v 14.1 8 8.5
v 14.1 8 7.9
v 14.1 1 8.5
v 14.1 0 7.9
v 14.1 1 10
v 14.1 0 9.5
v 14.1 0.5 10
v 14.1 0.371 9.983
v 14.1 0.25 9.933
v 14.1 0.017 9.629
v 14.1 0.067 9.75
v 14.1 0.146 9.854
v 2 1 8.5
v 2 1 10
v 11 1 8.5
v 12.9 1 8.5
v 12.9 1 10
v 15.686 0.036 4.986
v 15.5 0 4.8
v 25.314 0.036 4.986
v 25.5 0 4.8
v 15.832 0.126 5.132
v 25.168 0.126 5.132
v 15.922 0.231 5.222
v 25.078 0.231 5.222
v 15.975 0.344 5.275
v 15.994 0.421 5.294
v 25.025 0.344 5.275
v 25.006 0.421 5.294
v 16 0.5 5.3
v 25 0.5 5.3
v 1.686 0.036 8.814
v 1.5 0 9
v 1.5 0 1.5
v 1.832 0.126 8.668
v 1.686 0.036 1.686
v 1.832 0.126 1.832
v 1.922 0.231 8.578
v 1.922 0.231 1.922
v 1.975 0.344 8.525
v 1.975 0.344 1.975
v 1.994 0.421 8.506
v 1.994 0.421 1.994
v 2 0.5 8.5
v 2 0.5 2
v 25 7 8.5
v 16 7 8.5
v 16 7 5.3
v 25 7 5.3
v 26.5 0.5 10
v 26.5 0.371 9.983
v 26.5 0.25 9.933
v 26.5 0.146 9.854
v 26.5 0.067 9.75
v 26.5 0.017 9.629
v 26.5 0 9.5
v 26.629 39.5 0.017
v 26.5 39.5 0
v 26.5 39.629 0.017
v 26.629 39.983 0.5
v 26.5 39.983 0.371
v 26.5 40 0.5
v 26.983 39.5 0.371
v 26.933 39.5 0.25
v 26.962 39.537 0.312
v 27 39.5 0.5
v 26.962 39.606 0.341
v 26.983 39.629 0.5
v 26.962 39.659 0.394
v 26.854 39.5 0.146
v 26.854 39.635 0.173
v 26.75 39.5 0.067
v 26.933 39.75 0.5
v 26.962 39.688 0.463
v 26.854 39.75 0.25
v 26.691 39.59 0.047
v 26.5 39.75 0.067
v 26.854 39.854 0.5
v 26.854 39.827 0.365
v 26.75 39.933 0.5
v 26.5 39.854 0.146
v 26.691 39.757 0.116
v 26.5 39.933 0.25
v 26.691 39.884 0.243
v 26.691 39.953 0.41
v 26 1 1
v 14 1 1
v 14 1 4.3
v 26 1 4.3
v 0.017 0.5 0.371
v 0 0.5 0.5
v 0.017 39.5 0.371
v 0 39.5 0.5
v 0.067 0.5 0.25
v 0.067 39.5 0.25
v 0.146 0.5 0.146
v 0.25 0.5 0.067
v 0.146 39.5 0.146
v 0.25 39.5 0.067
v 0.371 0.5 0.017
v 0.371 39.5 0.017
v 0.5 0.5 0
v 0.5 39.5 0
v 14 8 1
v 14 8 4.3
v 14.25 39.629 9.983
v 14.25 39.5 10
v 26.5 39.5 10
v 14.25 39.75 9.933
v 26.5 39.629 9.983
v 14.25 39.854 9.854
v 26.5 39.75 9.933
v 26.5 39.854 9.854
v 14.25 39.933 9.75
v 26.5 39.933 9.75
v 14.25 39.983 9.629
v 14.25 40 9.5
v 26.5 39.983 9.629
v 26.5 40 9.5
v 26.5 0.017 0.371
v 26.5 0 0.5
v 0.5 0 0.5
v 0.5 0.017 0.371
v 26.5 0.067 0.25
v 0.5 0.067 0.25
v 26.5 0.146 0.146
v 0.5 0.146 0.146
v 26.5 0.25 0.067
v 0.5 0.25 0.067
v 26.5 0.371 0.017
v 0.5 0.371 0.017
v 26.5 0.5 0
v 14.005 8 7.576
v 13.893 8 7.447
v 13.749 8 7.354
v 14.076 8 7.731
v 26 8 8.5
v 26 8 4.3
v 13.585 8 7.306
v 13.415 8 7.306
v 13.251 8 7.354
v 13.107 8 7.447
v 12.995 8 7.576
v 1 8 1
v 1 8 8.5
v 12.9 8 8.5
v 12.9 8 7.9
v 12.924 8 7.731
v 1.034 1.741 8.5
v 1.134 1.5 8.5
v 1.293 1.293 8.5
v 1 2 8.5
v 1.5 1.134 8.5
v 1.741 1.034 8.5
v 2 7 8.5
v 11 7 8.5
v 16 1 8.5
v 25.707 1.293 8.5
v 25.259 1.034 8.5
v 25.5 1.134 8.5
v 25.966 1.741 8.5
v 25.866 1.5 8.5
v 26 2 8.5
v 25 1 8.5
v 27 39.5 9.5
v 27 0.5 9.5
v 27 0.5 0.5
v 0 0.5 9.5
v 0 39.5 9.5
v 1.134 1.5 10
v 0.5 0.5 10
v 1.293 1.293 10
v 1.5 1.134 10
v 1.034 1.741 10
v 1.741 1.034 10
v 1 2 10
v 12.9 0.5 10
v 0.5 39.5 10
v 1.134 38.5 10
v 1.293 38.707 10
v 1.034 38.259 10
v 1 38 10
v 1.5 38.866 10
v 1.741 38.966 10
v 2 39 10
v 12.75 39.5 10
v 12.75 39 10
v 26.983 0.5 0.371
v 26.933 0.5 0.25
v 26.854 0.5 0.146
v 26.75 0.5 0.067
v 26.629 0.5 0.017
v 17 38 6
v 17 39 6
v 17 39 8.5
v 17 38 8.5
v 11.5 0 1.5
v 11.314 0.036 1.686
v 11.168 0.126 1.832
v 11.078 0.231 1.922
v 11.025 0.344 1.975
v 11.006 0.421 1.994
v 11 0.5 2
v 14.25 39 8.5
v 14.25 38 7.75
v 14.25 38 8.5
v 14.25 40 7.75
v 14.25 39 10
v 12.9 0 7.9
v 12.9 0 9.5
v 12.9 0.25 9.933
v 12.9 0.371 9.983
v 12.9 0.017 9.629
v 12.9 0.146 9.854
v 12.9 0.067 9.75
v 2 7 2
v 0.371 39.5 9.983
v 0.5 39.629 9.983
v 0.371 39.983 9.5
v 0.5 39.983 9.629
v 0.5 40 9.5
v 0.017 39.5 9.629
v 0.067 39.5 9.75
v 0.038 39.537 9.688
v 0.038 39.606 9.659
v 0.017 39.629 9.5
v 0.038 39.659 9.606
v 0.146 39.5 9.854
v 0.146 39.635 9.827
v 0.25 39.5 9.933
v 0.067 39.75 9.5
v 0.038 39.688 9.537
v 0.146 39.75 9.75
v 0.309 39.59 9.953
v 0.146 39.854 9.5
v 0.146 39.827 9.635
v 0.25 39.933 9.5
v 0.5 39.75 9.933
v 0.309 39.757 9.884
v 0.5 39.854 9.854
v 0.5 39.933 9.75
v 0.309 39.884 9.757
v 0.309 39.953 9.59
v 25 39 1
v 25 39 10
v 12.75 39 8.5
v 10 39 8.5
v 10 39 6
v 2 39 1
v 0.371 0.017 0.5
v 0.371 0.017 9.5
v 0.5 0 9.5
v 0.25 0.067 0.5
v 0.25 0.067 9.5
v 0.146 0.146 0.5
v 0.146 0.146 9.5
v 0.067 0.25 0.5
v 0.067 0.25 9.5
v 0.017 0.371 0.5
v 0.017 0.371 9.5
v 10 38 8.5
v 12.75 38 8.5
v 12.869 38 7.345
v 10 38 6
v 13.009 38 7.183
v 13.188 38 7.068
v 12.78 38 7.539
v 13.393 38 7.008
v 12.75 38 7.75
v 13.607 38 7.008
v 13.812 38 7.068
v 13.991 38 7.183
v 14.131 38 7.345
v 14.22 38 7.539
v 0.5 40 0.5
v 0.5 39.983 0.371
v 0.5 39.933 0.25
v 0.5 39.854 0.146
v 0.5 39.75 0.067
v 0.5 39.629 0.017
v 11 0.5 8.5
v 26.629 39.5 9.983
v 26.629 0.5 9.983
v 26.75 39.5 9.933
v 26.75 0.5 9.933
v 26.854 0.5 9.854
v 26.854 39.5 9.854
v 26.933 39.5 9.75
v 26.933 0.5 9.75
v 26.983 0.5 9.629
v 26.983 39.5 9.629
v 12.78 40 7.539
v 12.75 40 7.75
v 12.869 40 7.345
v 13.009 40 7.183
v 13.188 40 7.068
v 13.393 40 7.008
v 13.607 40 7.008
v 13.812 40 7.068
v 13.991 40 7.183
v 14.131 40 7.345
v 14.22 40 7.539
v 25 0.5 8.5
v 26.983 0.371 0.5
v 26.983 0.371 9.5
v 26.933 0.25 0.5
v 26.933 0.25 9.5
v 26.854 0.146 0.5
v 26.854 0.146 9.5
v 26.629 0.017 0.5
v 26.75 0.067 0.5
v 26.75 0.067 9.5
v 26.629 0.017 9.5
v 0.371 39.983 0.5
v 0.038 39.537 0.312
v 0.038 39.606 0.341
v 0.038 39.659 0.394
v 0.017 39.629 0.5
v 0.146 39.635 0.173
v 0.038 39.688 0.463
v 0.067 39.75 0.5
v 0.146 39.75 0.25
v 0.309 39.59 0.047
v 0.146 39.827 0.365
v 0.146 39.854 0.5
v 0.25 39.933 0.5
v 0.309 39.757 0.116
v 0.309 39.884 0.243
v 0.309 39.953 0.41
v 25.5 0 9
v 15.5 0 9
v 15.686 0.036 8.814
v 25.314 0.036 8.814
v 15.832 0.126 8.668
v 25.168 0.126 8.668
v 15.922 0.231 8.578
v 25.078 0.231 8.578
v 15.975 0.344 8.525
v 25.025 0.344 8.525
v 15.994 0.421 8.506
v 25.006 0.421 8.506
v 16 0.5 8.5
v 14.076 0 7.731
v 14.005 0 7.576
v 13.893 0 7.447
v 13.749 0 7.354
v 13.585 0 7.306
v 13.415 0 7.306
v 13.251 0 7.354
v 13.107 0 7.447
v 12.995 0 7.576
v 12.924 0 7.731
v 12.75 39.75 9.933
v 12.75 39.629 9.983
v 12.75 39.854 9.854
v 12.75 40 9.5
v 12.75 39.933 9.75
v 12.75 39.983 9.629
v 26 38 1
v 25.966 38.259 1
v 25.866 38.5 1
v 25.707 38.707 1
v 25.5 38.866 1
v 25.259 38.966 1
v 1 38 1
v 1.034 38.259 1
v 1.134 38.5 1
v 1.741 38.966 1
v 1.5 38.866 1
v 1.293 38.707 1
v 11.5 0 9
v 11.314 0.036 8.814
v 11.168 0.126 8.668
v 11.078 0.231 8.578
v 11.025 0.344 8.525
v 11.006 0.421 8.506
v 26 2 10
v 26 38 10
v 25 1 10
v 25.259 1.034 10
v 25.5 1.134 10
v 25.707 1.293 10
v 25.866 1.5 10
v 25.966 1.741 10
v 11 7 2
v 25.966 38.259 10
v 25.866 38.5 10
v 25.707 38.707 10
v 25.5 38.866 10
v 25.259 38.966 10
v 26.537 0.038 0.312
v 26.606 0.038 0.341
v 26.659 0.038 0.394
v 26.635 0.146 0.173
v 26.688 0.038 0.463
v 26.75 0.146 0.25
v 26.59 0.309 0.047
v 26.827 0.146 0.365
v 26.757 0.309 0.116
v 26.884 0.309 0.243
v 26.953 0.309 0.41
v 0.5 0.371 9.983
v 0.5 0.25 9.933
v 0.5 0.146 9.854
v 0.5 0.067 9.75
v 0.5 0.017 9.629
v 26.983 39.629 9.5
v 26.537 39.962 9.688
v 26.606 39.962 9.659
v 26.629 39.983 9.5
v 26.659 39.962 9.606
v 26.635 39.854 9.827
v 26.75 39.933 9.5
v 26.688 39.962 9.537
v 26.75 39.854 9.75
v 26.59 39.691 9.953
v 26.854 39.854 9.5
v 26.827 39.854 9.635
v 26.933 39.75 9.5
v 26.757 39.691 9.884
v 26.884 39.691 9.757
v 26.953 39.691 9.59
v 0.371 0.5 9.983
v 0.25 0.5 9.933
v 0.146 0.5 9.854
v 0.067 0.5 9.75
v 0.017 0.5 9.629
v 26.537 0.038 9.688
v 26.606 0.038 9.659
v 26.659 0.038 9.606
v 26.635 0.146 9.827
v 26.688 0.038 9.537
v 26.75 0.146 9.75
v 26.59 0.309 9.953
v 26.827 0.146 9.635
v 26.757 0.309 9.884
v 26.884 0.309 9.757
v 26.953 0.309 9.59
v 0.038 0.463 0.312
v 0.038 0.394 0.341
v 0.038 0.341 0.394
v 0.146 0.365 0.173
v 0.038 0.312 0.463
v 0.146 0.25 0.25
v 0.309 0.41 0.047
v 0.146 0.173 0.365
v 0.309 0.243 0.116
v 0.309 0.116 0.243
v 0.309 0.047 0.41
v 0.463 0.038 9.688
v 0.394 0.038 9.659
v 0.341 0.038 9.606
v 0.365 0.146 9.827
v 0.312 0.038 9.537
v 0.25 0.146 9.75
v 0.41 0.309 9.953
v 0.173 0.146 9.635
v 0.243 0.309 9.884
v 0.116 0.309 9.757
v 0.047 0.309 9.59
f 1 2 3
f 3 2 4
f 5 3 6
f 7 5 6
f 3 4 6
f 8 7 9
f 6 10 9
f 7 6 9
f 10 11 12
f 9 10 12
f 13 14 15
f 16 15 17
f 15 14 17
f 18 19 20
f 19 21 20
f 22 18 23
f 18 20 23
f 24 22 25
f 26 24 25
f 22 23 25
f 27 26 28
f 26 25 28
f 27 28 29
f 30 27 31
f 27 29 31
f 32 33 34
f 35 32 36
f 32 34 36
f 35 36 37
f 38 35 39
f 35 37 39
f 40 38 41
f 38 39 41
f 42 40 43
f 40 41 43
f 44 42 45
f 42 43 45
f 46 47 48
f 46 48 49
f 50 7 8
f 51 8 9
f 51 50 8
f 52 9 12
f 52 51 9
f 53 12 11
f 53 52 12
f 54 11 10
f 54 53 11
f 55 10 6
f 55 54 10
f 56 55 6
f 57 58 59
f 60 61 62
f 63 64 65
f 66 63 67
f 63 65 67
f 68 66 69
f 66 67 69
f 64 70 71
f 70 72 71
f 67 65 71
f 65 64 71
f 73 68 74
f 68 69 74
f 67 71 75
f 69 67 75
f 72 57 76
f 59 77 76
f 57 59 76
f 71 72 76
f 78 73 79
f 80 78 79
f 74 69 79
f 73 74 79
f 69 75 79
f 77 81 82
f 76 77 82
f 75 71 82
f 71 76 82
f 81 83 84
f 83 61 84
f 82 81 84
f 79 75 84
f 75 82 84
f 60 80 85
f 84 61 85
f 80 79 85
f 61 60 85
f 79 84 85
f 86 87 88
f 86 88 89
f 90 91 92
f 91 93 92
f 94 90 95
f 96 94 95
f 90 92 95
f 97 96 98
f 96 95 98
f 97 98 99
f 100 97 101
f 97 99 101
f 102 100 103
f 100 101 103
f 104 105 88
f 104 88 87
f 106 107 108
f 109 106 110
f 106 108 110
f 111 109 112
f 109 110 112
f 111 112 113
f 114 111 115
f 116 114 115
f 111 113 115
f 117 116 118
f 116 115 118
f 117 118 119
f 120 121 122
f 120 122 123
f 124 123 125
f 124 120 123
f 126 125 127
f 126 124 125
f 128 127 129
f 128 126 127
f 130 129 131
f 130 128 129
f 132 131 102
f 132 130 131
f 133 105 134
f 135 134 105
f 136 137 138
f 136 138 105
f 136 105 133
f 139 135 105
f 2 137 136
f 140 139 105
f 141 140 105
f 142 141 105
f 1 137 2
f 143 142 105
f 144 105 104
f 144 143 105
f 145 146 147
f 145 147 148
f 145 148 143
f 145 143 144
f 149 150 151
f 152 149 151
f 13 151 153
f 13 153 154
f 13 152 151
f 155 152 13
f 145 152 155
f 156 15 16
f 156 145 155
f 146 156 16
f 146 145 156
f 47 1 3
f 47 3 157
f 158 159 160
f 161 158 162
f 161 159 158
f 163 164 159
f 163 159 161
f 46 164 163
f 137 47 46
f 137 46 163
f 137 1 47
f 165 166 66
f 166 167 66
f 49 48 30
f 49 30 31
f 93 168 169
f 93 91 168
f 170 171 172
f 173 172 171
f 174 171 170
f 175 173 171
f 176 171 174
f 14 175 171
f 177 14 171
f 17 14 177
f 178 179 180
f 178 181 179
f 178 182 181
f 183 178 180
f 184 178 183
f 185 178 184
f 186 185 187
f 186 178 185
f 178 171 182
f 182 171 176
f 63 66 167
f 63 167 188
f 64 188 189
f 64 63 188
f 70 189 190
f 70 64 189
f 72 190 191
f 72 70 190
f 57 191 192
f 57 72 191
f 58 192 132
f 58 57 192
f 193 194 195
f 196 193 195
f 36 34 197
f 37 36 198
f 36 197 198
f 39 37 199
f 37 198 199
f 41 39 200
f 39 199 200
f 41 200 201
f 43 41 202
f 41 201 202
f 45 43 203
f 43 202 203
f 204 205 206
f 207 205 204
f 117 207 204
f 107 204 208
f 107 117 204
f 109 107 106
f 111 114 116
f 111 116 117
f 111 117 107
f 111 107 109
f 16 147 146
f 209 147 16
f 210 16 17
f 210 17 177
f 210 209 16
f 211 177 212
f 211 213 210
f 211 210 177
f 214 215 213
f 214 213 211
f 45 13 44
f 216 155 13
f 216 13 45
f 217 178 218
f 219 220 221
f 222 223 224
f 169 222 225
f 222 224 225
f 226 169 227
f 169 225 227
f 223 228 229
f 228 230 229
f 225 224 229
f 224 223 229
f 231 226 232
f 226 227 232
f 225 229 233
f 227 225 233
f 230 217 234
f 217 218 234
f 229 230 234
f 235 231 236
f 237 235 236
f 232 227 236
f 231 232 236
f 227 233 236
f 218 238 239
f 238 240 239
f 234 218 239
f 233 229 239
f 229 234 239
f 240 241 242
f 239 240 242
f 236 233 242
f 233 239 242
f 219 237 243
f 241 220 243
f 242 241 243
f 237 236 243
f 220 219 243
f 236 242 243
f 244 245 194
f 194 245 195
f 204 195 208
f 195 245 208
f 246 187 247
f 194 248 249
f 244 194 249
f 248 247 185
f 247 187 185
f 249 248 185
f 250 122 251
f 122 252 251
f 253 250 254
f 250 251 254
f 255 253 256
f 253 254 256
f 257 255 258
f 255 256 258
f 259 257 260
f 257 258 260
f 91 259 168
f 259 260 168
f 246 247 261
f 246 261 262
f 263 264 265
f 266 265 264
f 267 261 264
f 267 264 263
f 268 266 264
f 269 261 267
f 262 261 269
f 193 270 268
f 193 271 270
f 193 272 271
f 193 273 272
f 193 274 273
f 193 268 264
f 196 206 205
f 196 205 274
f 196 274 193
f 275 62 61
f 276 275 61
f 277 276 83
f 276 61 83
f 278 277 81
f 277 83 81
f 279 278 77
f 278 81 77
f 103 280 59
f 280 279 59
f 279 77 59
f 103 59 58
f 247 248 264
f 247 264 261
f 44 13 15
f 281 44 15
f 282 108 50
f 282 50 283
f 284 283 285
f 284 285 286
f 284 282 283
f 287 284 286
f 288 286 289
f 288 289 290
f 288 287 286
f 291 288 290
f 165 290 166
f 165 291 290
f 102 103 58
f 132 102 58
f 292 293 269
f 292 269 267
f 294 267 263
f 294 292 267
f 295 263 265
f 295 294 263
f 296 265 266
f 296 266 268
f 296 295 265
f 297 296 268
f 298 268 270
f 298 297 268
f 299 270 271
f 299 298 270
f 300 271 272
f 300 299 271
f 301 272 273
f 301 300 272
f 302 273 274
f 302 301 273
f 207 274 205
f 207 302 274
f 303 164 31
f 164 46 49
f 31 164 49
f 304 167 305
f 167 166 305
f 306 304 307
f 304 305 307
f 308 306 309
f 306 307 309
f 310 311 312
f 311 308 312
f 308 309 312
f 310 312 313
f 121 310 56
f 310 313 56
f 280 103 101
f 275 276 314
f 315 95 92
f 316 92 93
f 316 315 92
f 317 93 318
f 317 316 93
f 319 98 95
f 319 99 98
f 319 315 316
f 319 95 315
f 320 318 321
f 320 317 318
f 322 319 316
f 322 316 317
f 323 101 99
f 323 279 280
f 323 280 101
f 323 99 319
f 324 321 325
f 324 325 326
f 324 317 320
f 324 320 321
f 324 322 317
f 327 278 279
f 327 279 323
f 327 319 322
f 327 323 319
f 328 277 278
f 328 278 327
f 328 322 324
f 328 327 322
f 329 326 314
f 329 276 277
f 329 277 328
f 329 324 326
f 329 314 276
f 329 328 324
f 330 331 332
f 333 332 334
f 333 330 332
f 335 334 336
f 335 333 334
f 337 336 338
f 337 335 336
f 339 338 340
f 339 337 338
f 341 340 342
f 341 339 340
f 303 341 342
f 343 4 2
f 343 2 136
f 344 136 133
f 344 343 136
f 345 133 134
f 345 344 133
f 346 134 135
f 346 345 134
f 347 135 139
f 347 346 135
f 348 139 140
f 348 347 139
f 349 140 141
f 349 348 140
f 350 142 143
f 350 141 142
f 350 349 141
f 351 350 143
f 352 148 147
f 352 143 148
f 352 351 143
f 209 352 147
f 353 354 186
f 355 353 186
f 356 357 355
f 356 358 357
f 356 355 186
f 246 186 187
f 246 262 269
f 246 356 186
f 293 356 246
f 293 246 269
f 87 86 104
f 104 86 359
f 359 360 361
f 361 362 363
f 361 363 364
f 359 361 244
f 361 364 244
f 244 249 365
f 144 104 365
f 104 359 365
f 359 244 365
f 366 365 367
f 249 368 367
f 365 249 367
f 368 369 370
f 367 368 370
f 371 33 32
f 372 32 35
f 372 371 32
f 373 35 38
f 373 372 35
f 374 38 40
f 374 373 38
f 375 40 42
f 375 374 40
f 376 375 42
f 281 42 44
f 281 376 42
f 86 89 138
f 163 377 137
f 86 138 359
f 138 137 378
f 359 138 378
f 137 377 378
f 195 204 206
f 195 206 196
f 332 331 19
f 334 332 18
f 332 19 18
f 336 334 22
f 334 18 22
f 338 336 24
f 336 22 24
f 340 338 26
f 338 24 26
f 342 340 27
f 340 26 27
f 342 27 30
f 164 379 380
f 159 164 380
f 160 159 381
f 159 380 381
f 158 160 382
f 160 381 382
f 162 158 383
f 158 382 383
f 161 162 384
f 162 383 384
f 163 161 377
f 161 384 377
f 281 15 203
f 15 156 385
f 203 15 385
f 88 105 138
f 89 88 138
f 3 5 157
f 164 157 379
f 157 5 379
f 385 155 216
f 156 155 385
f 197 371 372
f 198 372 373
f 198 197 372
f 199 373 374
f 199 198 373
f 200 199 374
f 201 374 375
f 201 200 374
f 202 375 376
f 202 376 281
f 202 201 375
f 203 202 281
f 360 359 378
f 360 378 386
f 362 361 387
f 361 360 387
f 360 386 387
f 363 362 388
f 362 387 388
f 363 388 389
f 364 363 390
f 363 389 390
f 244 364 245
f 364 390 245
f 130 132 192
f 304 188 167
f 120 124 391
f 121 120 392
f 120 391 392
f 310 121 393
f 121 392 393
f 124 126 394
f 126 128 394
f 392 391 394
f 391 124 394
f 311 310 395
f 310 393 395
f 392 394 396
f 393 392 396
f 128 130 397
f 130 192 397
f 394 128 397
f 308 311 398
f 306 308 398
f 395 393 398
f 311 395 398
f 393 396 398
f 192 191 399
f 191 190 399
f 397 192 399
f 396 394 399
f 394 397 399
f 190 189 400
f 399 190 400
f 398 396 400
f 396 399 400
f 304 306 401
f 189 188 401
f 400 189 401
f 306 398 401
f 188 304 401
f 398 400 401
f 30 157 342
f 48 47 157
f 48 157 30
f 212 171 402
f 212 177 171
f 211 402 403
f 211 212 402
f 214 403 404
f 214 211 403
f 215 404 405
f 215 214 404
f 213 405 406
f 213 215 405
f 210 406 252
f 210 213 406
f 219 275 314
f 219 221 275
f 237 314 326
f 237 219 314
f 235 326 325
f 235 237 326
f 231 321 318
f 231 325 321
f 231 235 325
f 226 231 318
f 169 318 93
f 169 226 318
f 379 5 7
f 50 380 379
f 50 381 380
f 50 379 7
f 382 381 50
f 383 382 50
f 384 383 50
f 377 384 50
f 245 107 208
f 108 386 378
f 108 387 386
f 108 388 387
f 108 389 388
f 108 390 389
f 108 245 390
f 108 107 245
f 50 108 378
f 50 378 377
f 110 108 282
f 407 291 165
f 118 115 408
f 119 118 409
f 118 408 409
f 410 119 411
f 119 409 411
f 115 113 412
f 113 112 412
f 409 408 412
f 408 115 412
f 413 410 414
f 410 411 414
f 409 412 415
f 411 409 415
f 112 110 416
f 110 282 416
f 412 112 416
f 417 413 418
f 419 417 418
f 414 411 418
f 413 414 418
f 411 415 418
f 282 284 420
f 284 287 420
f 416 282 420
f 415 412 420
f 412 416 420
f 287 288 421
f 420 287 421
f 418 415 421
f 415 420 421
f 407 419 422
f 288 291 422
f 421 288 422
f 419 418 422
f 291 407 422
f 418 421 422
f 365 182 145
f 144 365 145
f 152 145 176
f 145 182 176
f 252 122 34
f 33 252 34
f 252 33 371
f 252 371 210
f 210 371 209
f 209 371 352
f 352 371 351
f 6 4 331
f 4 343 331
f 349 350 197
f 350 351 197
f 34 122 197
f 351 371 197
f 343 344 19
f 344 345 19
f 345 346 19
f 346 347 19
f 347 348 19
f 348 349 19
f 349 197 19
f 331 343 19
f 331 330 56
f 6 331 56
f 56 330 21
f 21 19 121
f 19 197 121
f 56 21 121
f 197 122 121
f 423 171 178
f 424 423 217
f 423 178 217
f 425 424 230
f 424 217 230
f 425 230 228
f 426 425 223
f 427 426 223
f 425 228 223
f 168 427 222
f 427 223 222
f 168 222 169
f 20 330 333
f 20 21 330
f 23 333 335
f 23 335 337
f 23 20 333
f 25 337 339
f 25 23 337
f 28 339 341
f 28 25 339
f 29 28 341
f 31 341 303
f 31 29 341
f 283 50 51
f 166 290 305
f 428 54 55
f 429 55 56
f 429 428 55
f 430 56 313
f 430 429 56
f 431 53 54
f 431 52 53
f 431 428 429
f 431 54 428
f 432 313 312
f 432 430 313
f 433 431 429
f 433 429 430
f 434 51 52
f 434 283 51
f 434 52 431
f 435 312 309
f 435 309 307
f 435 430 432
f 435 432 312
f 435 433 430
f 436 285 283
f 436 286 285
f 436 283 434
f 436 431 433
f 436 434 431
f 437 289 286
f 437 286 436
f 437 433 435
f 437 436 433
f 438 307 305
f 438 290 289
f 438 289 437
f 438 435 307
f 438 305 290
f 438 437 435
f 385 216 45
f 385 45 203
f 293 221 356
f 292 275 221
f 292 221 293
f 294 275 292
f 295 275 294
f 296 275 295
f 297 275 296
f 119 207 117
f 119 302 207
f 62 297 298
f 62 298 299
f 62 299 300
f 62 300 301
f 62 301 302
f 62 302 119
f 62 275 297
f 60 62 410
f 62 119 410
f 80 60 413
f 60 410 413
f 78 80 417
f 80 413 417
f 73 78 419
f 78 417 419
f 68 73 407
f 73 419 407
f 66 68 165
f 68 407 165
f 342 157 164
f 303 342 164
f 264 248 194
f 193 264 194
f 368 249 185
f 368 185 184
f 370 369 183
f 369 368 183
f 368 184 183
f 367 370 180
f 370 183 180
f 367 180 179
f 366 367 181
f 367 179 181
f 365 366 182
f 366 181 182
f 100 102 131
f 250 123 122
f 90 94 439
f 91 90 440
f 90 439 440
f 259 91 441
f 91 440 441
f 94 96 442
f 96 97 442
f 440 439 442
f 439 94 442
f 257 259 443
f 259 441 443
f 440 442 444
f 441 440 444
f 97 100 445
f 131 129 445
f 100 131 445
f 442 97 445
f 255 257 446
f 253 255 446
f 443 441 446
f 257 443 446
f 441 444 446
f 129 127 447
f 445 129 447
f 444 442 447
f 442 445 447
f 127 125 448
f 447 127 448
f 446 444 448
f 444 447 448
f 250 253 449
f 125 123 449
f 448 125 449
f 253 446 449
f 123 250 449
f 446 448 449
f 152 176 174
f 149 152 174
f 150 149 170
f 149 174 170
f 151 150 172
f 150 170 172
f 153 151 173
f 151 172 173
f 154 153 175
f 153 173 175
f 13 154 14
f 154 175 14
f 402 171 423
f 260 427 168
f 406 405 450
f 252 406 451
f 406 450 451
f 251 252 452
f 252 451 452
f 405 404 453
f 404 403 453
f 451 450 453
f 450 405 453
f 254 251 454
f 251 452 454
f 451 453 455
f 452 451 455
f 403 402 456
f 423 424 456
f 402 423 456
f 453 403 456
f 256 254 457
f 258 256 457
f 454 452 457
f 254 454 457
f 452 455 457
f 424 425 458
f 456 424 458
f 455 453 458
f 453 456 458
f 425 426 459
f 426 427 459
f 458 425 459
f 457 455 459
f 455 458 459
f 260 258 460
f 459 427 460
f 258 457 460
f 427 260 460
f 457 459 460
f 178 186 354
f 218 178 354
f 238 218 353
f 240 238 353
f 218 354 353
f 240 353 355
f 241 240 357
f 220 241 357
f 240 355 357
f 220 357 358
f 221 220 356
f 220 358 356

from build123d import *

# Parameters (mm, degrees)
SKETCH_2_W           = 27
SKETCH_2_H           = 40
EXTRUDE_1_DEPTH      = 10
CUT_EXTRUDE_1_DEPTH  = 1.5
CUT_EXTRUDE_2_DEPTH  = 7.5
SKETCH_9_W           = 9
SKETCH_9_H           = 4.718038217
CUT_EXTRUDE_8_DEPTH  = 3.2
SKETCH_9_3_W         = 9
SKETCH_9_3_H         = 4.718038217
CUT_EXTRUDE_9_DEPTH  = 6.5
SKETCH_12_W          = 12
SKETCH_12_H          = 3.3
CUT_EXTRUDE_10_DEPTH = 7
SKETCH_13_W          = 9
SKETCH_13_H          = 6.5
SKETCH_13_H_2        = 3.2
CUT_EXTRUDE_11_DEPTH = 3.281961783
CUT_EXTRUDE_12_REACH = 42
SKETCH_14_W          = 1.2
SKETCH_14_H          = 2.1
SKETCH_16_2_W        = 7
SKETCH_16_2_H        = 2.5
EXTRUDE_3_DEPTH      = 1
SKETCH_16_W          = 7
SKETCH_16_H          = 2.5
EXTRUDE_2_DEPTH      = 1
CUT_EXTRUDE_14_DEPTH = 2
FILLET_1_R           = 0.5


with BuildPart() as part:
    # Sketch 2 → Extrude 1 (new body)
    with BuildSketch(Plane.XY):
        with Locations((13.5, 20)):
            Rectangle(SKETCH_2_W, SKETCH_2_H)
    extrude(amount=EXTRUDE_1_DEPTH)

    # Sketch 3 → Cut-Extrude 1 (cut)
    with BuildSketch(Plane.XY.offset(10)):
        with BuildLine():
            Line((1, 38), (1, 2))
            ThreePointArc((1, 2), (1.292893219, 1.292893219), (2, 1))
            Line((2, 1), (25, 1))
            ThreePointArc((25, 1), (25.707106781, 1.292893219), (26, 2))
            Line((26, 2), (26, 38))
            ThreePointArc((26, 38), (25.707106781, 38.707106781), (25, 39))
            Line((25, 39), (2, 39))
            ThreePointArc((2, 39), (1.292893219, 38.707106781), (1, 38))
        make_face()
    extrude(amount=-CUT_EXTRUDE_1_DEPTH, mode=Mode.SUBTRACT)

    # Sketch 5 → Cut-Extrude 2 (cut)
    with BuildSketch(Plane.XY.offset(8.5)):
        with BuildLine():
            Line((2, 39), (25, 39))
            ThreePointArc((25, 39), (25.707106781, 38.707106781), (26, 38))
            Line((26, 38), (26, 8))
            Line((26, 8), (1, 8))
            Line((1, 8), (1, 38))
            ThreePointArc((1, 38), (1.292893219, 38.707106781), (2, 39))
        make_face()
    extrude(amount=-CUT_EXTRUDE_2_DEPTH, mode=Mode.SUBTRACT)

    # Sketch 9 → Cut-Extrude 8 (cut)
    with BuildSketch(Plane.XY.offset(8.5)):
        with Locations((20.5, 4.640980891)):
            Rectangle(SKETCH_9_W, SKETCH_9_H)
    extrude(amount=-CUT_EXTRUDE_8_DEPTH, mode=Mode.SUBTRACT)

    # Sketch 9_3 → Cut-Extrude 9 (cut)
    with BuildSketch(Plane.XY.offset(8.5)):
        with Locations((6.5, 4.640980891)):
            Rectangle(SKETCH_9_3_W, SKETCH_9_3_H)
    extrude(amount=-CUT_EXTRUDE_9_DEPTH, mode=Mode.SUBTRACT)

    # Sketch 12 → Cut-Extrude 10 (cut)
    with BuildSketch(Plane(origin=(0, 8, 0), x_dir=(1, 0, 0), z_dir=(0, 1, 0))):
        with Locations((20, -2.65)):
            Rectangle(SKETCH_12_W, SKETCH_12_H)
    extrude(amount=-CUT_EXTRUDE_10_DEPTH, mode=Mode.SUBTRACT)

    # Sketch 13 → Cut-Extrude 11 (cut, through all)
    with BuildSketch(Plane(origin=(0, 2.281961783, 0), x_dir=(1, 0, 0), z_dir=(0, 1, 0))):
        with Locations((6.5, -5.25)):
            Rectangle(SKETCH_13_W, SKETCH_13_H)
        with Locations((20.5, -6.9)):
            Rectangle(SKETCH_13_W, SKETCH_13_H_2)
    extrude(amount=-CUT_EXTRUDE_11_DEPTH, mode=Mode.SUBTRACT)

    # Sketch 14 → Cut-Extrude 12 (cut, up to next)
    with BuildSketch(Plane.XZ, mode=Mode.PRIVATE) as cut_extrude_12_sk1:
        with BuildLine():
            Line((12.9, 7.9), (14.1, 7.9))
            ThreePointArc((14.1, 7.9), (13.5, 7.3), (12.9, 7.9))
        make_face()
    cut_extrude_12_tool1 = extrude(cut_extrude_12_sk1.sketch, amount=-CUT_EXTRUDE_12_REACH, mode=Mode.PRIVATE) & part.part
    add(cut_extrude_12_tool1.solids().sort_by_distance((13.5, 0, 7.645352))[0], mode=Mode.SUBTRACT)
    # Sketch 14 → Cut-Extrude 12 (cut, up to next)
    with BuildSketch(Plane.XZ, mode=Mode.PRIVATE) as cut_extrude_12_sk2:
        with Locations((13.5, 8.95)):
            Rectangle(SKETCH_14_W, SKETCH_14_H)
    cut_extrude_12_tool2 = extrude(cut_extrude_12_sk2.sketch, amount=-CUT_EXTRUDE_12_REACH, mode=Mode.PRIVATE) & part.part
    add(cut_extrude_12_tool2.solids().sort_by_distance((13.5, 0, 8.95))[0], mode=Mode.SUBTRACT)

    # Sketch 16_2 → Extrude 3 (add)
    with BuildSketch(Plane.XZ.offset(-39)):
        with Locations((13.5, 7.25)):
            Rectangle(SKETCH_16_2_W, SKETCH_16_2_H)
    extrude(amount=EXTRUDE_3_DEPTH)

    # Sketch 16 → Extrude 2 (add)
    with BuildSketch(Plane.XZ.offset(-39)):
        with Locations((13.5, 7.25)):
            Rectangle(SKETCH_16_W, SKETCH_16_H)
    extrude(amount=EXTRUDE_2_DEPTH)

    # Sketch 17 → Cut-Extrude 14 (cut)
    with BuildSketch(Plane(origin=(0, 40, 0), x_dir=(1, 0, 0), z_dir=(0, 1, 0))):
        with BuildLine():
            Line((14.25, -7.75), (14.25, -10))
            Line((14.25, -10), (12.75, -10))
            Line((12.75, -10), (12.75, -7.75))
            ThreePointArc((12.75, -7.75), (13.5, -7), (14.25, -7.75))
        make_face()
    extrude(amount=-CUT_EXTRUDE_14_DEPTH, mode=Mode.SUBTRACT)

    # Fillet 1
    fillet_1_edges = [part.edges().sort_by_distance(p)[0] for p in [
        (27, 20, 10),
        (20.5, 0, 8.5),
        (25, 0, 6.9),
        (16, 0, 6.9),
        (20.5, 0, 5.3),
        (20.625, 40, 10),
        (20.55, 0, 10),
        (6.375, 40, 10),
        (0, 20, 10),
        (13.5, 40, 0),
        (27, 20, 0),
        (13.5, 0, 0),
        (0, 20, 0),
        (6.45, 0, 10),
        (0, 40, 5),
        (27, 40, 5),
        (27, 0, 5),
        (0, 0, 5),
        (6.5, 0, 8.5),
        (11, 0, 5.25),
        (2, 0, 5.25),
        (6.5, 0, 2),
    ]]
    fillet(fillet_1_edges, radius=FILLET_1_R)


solid = part.part
